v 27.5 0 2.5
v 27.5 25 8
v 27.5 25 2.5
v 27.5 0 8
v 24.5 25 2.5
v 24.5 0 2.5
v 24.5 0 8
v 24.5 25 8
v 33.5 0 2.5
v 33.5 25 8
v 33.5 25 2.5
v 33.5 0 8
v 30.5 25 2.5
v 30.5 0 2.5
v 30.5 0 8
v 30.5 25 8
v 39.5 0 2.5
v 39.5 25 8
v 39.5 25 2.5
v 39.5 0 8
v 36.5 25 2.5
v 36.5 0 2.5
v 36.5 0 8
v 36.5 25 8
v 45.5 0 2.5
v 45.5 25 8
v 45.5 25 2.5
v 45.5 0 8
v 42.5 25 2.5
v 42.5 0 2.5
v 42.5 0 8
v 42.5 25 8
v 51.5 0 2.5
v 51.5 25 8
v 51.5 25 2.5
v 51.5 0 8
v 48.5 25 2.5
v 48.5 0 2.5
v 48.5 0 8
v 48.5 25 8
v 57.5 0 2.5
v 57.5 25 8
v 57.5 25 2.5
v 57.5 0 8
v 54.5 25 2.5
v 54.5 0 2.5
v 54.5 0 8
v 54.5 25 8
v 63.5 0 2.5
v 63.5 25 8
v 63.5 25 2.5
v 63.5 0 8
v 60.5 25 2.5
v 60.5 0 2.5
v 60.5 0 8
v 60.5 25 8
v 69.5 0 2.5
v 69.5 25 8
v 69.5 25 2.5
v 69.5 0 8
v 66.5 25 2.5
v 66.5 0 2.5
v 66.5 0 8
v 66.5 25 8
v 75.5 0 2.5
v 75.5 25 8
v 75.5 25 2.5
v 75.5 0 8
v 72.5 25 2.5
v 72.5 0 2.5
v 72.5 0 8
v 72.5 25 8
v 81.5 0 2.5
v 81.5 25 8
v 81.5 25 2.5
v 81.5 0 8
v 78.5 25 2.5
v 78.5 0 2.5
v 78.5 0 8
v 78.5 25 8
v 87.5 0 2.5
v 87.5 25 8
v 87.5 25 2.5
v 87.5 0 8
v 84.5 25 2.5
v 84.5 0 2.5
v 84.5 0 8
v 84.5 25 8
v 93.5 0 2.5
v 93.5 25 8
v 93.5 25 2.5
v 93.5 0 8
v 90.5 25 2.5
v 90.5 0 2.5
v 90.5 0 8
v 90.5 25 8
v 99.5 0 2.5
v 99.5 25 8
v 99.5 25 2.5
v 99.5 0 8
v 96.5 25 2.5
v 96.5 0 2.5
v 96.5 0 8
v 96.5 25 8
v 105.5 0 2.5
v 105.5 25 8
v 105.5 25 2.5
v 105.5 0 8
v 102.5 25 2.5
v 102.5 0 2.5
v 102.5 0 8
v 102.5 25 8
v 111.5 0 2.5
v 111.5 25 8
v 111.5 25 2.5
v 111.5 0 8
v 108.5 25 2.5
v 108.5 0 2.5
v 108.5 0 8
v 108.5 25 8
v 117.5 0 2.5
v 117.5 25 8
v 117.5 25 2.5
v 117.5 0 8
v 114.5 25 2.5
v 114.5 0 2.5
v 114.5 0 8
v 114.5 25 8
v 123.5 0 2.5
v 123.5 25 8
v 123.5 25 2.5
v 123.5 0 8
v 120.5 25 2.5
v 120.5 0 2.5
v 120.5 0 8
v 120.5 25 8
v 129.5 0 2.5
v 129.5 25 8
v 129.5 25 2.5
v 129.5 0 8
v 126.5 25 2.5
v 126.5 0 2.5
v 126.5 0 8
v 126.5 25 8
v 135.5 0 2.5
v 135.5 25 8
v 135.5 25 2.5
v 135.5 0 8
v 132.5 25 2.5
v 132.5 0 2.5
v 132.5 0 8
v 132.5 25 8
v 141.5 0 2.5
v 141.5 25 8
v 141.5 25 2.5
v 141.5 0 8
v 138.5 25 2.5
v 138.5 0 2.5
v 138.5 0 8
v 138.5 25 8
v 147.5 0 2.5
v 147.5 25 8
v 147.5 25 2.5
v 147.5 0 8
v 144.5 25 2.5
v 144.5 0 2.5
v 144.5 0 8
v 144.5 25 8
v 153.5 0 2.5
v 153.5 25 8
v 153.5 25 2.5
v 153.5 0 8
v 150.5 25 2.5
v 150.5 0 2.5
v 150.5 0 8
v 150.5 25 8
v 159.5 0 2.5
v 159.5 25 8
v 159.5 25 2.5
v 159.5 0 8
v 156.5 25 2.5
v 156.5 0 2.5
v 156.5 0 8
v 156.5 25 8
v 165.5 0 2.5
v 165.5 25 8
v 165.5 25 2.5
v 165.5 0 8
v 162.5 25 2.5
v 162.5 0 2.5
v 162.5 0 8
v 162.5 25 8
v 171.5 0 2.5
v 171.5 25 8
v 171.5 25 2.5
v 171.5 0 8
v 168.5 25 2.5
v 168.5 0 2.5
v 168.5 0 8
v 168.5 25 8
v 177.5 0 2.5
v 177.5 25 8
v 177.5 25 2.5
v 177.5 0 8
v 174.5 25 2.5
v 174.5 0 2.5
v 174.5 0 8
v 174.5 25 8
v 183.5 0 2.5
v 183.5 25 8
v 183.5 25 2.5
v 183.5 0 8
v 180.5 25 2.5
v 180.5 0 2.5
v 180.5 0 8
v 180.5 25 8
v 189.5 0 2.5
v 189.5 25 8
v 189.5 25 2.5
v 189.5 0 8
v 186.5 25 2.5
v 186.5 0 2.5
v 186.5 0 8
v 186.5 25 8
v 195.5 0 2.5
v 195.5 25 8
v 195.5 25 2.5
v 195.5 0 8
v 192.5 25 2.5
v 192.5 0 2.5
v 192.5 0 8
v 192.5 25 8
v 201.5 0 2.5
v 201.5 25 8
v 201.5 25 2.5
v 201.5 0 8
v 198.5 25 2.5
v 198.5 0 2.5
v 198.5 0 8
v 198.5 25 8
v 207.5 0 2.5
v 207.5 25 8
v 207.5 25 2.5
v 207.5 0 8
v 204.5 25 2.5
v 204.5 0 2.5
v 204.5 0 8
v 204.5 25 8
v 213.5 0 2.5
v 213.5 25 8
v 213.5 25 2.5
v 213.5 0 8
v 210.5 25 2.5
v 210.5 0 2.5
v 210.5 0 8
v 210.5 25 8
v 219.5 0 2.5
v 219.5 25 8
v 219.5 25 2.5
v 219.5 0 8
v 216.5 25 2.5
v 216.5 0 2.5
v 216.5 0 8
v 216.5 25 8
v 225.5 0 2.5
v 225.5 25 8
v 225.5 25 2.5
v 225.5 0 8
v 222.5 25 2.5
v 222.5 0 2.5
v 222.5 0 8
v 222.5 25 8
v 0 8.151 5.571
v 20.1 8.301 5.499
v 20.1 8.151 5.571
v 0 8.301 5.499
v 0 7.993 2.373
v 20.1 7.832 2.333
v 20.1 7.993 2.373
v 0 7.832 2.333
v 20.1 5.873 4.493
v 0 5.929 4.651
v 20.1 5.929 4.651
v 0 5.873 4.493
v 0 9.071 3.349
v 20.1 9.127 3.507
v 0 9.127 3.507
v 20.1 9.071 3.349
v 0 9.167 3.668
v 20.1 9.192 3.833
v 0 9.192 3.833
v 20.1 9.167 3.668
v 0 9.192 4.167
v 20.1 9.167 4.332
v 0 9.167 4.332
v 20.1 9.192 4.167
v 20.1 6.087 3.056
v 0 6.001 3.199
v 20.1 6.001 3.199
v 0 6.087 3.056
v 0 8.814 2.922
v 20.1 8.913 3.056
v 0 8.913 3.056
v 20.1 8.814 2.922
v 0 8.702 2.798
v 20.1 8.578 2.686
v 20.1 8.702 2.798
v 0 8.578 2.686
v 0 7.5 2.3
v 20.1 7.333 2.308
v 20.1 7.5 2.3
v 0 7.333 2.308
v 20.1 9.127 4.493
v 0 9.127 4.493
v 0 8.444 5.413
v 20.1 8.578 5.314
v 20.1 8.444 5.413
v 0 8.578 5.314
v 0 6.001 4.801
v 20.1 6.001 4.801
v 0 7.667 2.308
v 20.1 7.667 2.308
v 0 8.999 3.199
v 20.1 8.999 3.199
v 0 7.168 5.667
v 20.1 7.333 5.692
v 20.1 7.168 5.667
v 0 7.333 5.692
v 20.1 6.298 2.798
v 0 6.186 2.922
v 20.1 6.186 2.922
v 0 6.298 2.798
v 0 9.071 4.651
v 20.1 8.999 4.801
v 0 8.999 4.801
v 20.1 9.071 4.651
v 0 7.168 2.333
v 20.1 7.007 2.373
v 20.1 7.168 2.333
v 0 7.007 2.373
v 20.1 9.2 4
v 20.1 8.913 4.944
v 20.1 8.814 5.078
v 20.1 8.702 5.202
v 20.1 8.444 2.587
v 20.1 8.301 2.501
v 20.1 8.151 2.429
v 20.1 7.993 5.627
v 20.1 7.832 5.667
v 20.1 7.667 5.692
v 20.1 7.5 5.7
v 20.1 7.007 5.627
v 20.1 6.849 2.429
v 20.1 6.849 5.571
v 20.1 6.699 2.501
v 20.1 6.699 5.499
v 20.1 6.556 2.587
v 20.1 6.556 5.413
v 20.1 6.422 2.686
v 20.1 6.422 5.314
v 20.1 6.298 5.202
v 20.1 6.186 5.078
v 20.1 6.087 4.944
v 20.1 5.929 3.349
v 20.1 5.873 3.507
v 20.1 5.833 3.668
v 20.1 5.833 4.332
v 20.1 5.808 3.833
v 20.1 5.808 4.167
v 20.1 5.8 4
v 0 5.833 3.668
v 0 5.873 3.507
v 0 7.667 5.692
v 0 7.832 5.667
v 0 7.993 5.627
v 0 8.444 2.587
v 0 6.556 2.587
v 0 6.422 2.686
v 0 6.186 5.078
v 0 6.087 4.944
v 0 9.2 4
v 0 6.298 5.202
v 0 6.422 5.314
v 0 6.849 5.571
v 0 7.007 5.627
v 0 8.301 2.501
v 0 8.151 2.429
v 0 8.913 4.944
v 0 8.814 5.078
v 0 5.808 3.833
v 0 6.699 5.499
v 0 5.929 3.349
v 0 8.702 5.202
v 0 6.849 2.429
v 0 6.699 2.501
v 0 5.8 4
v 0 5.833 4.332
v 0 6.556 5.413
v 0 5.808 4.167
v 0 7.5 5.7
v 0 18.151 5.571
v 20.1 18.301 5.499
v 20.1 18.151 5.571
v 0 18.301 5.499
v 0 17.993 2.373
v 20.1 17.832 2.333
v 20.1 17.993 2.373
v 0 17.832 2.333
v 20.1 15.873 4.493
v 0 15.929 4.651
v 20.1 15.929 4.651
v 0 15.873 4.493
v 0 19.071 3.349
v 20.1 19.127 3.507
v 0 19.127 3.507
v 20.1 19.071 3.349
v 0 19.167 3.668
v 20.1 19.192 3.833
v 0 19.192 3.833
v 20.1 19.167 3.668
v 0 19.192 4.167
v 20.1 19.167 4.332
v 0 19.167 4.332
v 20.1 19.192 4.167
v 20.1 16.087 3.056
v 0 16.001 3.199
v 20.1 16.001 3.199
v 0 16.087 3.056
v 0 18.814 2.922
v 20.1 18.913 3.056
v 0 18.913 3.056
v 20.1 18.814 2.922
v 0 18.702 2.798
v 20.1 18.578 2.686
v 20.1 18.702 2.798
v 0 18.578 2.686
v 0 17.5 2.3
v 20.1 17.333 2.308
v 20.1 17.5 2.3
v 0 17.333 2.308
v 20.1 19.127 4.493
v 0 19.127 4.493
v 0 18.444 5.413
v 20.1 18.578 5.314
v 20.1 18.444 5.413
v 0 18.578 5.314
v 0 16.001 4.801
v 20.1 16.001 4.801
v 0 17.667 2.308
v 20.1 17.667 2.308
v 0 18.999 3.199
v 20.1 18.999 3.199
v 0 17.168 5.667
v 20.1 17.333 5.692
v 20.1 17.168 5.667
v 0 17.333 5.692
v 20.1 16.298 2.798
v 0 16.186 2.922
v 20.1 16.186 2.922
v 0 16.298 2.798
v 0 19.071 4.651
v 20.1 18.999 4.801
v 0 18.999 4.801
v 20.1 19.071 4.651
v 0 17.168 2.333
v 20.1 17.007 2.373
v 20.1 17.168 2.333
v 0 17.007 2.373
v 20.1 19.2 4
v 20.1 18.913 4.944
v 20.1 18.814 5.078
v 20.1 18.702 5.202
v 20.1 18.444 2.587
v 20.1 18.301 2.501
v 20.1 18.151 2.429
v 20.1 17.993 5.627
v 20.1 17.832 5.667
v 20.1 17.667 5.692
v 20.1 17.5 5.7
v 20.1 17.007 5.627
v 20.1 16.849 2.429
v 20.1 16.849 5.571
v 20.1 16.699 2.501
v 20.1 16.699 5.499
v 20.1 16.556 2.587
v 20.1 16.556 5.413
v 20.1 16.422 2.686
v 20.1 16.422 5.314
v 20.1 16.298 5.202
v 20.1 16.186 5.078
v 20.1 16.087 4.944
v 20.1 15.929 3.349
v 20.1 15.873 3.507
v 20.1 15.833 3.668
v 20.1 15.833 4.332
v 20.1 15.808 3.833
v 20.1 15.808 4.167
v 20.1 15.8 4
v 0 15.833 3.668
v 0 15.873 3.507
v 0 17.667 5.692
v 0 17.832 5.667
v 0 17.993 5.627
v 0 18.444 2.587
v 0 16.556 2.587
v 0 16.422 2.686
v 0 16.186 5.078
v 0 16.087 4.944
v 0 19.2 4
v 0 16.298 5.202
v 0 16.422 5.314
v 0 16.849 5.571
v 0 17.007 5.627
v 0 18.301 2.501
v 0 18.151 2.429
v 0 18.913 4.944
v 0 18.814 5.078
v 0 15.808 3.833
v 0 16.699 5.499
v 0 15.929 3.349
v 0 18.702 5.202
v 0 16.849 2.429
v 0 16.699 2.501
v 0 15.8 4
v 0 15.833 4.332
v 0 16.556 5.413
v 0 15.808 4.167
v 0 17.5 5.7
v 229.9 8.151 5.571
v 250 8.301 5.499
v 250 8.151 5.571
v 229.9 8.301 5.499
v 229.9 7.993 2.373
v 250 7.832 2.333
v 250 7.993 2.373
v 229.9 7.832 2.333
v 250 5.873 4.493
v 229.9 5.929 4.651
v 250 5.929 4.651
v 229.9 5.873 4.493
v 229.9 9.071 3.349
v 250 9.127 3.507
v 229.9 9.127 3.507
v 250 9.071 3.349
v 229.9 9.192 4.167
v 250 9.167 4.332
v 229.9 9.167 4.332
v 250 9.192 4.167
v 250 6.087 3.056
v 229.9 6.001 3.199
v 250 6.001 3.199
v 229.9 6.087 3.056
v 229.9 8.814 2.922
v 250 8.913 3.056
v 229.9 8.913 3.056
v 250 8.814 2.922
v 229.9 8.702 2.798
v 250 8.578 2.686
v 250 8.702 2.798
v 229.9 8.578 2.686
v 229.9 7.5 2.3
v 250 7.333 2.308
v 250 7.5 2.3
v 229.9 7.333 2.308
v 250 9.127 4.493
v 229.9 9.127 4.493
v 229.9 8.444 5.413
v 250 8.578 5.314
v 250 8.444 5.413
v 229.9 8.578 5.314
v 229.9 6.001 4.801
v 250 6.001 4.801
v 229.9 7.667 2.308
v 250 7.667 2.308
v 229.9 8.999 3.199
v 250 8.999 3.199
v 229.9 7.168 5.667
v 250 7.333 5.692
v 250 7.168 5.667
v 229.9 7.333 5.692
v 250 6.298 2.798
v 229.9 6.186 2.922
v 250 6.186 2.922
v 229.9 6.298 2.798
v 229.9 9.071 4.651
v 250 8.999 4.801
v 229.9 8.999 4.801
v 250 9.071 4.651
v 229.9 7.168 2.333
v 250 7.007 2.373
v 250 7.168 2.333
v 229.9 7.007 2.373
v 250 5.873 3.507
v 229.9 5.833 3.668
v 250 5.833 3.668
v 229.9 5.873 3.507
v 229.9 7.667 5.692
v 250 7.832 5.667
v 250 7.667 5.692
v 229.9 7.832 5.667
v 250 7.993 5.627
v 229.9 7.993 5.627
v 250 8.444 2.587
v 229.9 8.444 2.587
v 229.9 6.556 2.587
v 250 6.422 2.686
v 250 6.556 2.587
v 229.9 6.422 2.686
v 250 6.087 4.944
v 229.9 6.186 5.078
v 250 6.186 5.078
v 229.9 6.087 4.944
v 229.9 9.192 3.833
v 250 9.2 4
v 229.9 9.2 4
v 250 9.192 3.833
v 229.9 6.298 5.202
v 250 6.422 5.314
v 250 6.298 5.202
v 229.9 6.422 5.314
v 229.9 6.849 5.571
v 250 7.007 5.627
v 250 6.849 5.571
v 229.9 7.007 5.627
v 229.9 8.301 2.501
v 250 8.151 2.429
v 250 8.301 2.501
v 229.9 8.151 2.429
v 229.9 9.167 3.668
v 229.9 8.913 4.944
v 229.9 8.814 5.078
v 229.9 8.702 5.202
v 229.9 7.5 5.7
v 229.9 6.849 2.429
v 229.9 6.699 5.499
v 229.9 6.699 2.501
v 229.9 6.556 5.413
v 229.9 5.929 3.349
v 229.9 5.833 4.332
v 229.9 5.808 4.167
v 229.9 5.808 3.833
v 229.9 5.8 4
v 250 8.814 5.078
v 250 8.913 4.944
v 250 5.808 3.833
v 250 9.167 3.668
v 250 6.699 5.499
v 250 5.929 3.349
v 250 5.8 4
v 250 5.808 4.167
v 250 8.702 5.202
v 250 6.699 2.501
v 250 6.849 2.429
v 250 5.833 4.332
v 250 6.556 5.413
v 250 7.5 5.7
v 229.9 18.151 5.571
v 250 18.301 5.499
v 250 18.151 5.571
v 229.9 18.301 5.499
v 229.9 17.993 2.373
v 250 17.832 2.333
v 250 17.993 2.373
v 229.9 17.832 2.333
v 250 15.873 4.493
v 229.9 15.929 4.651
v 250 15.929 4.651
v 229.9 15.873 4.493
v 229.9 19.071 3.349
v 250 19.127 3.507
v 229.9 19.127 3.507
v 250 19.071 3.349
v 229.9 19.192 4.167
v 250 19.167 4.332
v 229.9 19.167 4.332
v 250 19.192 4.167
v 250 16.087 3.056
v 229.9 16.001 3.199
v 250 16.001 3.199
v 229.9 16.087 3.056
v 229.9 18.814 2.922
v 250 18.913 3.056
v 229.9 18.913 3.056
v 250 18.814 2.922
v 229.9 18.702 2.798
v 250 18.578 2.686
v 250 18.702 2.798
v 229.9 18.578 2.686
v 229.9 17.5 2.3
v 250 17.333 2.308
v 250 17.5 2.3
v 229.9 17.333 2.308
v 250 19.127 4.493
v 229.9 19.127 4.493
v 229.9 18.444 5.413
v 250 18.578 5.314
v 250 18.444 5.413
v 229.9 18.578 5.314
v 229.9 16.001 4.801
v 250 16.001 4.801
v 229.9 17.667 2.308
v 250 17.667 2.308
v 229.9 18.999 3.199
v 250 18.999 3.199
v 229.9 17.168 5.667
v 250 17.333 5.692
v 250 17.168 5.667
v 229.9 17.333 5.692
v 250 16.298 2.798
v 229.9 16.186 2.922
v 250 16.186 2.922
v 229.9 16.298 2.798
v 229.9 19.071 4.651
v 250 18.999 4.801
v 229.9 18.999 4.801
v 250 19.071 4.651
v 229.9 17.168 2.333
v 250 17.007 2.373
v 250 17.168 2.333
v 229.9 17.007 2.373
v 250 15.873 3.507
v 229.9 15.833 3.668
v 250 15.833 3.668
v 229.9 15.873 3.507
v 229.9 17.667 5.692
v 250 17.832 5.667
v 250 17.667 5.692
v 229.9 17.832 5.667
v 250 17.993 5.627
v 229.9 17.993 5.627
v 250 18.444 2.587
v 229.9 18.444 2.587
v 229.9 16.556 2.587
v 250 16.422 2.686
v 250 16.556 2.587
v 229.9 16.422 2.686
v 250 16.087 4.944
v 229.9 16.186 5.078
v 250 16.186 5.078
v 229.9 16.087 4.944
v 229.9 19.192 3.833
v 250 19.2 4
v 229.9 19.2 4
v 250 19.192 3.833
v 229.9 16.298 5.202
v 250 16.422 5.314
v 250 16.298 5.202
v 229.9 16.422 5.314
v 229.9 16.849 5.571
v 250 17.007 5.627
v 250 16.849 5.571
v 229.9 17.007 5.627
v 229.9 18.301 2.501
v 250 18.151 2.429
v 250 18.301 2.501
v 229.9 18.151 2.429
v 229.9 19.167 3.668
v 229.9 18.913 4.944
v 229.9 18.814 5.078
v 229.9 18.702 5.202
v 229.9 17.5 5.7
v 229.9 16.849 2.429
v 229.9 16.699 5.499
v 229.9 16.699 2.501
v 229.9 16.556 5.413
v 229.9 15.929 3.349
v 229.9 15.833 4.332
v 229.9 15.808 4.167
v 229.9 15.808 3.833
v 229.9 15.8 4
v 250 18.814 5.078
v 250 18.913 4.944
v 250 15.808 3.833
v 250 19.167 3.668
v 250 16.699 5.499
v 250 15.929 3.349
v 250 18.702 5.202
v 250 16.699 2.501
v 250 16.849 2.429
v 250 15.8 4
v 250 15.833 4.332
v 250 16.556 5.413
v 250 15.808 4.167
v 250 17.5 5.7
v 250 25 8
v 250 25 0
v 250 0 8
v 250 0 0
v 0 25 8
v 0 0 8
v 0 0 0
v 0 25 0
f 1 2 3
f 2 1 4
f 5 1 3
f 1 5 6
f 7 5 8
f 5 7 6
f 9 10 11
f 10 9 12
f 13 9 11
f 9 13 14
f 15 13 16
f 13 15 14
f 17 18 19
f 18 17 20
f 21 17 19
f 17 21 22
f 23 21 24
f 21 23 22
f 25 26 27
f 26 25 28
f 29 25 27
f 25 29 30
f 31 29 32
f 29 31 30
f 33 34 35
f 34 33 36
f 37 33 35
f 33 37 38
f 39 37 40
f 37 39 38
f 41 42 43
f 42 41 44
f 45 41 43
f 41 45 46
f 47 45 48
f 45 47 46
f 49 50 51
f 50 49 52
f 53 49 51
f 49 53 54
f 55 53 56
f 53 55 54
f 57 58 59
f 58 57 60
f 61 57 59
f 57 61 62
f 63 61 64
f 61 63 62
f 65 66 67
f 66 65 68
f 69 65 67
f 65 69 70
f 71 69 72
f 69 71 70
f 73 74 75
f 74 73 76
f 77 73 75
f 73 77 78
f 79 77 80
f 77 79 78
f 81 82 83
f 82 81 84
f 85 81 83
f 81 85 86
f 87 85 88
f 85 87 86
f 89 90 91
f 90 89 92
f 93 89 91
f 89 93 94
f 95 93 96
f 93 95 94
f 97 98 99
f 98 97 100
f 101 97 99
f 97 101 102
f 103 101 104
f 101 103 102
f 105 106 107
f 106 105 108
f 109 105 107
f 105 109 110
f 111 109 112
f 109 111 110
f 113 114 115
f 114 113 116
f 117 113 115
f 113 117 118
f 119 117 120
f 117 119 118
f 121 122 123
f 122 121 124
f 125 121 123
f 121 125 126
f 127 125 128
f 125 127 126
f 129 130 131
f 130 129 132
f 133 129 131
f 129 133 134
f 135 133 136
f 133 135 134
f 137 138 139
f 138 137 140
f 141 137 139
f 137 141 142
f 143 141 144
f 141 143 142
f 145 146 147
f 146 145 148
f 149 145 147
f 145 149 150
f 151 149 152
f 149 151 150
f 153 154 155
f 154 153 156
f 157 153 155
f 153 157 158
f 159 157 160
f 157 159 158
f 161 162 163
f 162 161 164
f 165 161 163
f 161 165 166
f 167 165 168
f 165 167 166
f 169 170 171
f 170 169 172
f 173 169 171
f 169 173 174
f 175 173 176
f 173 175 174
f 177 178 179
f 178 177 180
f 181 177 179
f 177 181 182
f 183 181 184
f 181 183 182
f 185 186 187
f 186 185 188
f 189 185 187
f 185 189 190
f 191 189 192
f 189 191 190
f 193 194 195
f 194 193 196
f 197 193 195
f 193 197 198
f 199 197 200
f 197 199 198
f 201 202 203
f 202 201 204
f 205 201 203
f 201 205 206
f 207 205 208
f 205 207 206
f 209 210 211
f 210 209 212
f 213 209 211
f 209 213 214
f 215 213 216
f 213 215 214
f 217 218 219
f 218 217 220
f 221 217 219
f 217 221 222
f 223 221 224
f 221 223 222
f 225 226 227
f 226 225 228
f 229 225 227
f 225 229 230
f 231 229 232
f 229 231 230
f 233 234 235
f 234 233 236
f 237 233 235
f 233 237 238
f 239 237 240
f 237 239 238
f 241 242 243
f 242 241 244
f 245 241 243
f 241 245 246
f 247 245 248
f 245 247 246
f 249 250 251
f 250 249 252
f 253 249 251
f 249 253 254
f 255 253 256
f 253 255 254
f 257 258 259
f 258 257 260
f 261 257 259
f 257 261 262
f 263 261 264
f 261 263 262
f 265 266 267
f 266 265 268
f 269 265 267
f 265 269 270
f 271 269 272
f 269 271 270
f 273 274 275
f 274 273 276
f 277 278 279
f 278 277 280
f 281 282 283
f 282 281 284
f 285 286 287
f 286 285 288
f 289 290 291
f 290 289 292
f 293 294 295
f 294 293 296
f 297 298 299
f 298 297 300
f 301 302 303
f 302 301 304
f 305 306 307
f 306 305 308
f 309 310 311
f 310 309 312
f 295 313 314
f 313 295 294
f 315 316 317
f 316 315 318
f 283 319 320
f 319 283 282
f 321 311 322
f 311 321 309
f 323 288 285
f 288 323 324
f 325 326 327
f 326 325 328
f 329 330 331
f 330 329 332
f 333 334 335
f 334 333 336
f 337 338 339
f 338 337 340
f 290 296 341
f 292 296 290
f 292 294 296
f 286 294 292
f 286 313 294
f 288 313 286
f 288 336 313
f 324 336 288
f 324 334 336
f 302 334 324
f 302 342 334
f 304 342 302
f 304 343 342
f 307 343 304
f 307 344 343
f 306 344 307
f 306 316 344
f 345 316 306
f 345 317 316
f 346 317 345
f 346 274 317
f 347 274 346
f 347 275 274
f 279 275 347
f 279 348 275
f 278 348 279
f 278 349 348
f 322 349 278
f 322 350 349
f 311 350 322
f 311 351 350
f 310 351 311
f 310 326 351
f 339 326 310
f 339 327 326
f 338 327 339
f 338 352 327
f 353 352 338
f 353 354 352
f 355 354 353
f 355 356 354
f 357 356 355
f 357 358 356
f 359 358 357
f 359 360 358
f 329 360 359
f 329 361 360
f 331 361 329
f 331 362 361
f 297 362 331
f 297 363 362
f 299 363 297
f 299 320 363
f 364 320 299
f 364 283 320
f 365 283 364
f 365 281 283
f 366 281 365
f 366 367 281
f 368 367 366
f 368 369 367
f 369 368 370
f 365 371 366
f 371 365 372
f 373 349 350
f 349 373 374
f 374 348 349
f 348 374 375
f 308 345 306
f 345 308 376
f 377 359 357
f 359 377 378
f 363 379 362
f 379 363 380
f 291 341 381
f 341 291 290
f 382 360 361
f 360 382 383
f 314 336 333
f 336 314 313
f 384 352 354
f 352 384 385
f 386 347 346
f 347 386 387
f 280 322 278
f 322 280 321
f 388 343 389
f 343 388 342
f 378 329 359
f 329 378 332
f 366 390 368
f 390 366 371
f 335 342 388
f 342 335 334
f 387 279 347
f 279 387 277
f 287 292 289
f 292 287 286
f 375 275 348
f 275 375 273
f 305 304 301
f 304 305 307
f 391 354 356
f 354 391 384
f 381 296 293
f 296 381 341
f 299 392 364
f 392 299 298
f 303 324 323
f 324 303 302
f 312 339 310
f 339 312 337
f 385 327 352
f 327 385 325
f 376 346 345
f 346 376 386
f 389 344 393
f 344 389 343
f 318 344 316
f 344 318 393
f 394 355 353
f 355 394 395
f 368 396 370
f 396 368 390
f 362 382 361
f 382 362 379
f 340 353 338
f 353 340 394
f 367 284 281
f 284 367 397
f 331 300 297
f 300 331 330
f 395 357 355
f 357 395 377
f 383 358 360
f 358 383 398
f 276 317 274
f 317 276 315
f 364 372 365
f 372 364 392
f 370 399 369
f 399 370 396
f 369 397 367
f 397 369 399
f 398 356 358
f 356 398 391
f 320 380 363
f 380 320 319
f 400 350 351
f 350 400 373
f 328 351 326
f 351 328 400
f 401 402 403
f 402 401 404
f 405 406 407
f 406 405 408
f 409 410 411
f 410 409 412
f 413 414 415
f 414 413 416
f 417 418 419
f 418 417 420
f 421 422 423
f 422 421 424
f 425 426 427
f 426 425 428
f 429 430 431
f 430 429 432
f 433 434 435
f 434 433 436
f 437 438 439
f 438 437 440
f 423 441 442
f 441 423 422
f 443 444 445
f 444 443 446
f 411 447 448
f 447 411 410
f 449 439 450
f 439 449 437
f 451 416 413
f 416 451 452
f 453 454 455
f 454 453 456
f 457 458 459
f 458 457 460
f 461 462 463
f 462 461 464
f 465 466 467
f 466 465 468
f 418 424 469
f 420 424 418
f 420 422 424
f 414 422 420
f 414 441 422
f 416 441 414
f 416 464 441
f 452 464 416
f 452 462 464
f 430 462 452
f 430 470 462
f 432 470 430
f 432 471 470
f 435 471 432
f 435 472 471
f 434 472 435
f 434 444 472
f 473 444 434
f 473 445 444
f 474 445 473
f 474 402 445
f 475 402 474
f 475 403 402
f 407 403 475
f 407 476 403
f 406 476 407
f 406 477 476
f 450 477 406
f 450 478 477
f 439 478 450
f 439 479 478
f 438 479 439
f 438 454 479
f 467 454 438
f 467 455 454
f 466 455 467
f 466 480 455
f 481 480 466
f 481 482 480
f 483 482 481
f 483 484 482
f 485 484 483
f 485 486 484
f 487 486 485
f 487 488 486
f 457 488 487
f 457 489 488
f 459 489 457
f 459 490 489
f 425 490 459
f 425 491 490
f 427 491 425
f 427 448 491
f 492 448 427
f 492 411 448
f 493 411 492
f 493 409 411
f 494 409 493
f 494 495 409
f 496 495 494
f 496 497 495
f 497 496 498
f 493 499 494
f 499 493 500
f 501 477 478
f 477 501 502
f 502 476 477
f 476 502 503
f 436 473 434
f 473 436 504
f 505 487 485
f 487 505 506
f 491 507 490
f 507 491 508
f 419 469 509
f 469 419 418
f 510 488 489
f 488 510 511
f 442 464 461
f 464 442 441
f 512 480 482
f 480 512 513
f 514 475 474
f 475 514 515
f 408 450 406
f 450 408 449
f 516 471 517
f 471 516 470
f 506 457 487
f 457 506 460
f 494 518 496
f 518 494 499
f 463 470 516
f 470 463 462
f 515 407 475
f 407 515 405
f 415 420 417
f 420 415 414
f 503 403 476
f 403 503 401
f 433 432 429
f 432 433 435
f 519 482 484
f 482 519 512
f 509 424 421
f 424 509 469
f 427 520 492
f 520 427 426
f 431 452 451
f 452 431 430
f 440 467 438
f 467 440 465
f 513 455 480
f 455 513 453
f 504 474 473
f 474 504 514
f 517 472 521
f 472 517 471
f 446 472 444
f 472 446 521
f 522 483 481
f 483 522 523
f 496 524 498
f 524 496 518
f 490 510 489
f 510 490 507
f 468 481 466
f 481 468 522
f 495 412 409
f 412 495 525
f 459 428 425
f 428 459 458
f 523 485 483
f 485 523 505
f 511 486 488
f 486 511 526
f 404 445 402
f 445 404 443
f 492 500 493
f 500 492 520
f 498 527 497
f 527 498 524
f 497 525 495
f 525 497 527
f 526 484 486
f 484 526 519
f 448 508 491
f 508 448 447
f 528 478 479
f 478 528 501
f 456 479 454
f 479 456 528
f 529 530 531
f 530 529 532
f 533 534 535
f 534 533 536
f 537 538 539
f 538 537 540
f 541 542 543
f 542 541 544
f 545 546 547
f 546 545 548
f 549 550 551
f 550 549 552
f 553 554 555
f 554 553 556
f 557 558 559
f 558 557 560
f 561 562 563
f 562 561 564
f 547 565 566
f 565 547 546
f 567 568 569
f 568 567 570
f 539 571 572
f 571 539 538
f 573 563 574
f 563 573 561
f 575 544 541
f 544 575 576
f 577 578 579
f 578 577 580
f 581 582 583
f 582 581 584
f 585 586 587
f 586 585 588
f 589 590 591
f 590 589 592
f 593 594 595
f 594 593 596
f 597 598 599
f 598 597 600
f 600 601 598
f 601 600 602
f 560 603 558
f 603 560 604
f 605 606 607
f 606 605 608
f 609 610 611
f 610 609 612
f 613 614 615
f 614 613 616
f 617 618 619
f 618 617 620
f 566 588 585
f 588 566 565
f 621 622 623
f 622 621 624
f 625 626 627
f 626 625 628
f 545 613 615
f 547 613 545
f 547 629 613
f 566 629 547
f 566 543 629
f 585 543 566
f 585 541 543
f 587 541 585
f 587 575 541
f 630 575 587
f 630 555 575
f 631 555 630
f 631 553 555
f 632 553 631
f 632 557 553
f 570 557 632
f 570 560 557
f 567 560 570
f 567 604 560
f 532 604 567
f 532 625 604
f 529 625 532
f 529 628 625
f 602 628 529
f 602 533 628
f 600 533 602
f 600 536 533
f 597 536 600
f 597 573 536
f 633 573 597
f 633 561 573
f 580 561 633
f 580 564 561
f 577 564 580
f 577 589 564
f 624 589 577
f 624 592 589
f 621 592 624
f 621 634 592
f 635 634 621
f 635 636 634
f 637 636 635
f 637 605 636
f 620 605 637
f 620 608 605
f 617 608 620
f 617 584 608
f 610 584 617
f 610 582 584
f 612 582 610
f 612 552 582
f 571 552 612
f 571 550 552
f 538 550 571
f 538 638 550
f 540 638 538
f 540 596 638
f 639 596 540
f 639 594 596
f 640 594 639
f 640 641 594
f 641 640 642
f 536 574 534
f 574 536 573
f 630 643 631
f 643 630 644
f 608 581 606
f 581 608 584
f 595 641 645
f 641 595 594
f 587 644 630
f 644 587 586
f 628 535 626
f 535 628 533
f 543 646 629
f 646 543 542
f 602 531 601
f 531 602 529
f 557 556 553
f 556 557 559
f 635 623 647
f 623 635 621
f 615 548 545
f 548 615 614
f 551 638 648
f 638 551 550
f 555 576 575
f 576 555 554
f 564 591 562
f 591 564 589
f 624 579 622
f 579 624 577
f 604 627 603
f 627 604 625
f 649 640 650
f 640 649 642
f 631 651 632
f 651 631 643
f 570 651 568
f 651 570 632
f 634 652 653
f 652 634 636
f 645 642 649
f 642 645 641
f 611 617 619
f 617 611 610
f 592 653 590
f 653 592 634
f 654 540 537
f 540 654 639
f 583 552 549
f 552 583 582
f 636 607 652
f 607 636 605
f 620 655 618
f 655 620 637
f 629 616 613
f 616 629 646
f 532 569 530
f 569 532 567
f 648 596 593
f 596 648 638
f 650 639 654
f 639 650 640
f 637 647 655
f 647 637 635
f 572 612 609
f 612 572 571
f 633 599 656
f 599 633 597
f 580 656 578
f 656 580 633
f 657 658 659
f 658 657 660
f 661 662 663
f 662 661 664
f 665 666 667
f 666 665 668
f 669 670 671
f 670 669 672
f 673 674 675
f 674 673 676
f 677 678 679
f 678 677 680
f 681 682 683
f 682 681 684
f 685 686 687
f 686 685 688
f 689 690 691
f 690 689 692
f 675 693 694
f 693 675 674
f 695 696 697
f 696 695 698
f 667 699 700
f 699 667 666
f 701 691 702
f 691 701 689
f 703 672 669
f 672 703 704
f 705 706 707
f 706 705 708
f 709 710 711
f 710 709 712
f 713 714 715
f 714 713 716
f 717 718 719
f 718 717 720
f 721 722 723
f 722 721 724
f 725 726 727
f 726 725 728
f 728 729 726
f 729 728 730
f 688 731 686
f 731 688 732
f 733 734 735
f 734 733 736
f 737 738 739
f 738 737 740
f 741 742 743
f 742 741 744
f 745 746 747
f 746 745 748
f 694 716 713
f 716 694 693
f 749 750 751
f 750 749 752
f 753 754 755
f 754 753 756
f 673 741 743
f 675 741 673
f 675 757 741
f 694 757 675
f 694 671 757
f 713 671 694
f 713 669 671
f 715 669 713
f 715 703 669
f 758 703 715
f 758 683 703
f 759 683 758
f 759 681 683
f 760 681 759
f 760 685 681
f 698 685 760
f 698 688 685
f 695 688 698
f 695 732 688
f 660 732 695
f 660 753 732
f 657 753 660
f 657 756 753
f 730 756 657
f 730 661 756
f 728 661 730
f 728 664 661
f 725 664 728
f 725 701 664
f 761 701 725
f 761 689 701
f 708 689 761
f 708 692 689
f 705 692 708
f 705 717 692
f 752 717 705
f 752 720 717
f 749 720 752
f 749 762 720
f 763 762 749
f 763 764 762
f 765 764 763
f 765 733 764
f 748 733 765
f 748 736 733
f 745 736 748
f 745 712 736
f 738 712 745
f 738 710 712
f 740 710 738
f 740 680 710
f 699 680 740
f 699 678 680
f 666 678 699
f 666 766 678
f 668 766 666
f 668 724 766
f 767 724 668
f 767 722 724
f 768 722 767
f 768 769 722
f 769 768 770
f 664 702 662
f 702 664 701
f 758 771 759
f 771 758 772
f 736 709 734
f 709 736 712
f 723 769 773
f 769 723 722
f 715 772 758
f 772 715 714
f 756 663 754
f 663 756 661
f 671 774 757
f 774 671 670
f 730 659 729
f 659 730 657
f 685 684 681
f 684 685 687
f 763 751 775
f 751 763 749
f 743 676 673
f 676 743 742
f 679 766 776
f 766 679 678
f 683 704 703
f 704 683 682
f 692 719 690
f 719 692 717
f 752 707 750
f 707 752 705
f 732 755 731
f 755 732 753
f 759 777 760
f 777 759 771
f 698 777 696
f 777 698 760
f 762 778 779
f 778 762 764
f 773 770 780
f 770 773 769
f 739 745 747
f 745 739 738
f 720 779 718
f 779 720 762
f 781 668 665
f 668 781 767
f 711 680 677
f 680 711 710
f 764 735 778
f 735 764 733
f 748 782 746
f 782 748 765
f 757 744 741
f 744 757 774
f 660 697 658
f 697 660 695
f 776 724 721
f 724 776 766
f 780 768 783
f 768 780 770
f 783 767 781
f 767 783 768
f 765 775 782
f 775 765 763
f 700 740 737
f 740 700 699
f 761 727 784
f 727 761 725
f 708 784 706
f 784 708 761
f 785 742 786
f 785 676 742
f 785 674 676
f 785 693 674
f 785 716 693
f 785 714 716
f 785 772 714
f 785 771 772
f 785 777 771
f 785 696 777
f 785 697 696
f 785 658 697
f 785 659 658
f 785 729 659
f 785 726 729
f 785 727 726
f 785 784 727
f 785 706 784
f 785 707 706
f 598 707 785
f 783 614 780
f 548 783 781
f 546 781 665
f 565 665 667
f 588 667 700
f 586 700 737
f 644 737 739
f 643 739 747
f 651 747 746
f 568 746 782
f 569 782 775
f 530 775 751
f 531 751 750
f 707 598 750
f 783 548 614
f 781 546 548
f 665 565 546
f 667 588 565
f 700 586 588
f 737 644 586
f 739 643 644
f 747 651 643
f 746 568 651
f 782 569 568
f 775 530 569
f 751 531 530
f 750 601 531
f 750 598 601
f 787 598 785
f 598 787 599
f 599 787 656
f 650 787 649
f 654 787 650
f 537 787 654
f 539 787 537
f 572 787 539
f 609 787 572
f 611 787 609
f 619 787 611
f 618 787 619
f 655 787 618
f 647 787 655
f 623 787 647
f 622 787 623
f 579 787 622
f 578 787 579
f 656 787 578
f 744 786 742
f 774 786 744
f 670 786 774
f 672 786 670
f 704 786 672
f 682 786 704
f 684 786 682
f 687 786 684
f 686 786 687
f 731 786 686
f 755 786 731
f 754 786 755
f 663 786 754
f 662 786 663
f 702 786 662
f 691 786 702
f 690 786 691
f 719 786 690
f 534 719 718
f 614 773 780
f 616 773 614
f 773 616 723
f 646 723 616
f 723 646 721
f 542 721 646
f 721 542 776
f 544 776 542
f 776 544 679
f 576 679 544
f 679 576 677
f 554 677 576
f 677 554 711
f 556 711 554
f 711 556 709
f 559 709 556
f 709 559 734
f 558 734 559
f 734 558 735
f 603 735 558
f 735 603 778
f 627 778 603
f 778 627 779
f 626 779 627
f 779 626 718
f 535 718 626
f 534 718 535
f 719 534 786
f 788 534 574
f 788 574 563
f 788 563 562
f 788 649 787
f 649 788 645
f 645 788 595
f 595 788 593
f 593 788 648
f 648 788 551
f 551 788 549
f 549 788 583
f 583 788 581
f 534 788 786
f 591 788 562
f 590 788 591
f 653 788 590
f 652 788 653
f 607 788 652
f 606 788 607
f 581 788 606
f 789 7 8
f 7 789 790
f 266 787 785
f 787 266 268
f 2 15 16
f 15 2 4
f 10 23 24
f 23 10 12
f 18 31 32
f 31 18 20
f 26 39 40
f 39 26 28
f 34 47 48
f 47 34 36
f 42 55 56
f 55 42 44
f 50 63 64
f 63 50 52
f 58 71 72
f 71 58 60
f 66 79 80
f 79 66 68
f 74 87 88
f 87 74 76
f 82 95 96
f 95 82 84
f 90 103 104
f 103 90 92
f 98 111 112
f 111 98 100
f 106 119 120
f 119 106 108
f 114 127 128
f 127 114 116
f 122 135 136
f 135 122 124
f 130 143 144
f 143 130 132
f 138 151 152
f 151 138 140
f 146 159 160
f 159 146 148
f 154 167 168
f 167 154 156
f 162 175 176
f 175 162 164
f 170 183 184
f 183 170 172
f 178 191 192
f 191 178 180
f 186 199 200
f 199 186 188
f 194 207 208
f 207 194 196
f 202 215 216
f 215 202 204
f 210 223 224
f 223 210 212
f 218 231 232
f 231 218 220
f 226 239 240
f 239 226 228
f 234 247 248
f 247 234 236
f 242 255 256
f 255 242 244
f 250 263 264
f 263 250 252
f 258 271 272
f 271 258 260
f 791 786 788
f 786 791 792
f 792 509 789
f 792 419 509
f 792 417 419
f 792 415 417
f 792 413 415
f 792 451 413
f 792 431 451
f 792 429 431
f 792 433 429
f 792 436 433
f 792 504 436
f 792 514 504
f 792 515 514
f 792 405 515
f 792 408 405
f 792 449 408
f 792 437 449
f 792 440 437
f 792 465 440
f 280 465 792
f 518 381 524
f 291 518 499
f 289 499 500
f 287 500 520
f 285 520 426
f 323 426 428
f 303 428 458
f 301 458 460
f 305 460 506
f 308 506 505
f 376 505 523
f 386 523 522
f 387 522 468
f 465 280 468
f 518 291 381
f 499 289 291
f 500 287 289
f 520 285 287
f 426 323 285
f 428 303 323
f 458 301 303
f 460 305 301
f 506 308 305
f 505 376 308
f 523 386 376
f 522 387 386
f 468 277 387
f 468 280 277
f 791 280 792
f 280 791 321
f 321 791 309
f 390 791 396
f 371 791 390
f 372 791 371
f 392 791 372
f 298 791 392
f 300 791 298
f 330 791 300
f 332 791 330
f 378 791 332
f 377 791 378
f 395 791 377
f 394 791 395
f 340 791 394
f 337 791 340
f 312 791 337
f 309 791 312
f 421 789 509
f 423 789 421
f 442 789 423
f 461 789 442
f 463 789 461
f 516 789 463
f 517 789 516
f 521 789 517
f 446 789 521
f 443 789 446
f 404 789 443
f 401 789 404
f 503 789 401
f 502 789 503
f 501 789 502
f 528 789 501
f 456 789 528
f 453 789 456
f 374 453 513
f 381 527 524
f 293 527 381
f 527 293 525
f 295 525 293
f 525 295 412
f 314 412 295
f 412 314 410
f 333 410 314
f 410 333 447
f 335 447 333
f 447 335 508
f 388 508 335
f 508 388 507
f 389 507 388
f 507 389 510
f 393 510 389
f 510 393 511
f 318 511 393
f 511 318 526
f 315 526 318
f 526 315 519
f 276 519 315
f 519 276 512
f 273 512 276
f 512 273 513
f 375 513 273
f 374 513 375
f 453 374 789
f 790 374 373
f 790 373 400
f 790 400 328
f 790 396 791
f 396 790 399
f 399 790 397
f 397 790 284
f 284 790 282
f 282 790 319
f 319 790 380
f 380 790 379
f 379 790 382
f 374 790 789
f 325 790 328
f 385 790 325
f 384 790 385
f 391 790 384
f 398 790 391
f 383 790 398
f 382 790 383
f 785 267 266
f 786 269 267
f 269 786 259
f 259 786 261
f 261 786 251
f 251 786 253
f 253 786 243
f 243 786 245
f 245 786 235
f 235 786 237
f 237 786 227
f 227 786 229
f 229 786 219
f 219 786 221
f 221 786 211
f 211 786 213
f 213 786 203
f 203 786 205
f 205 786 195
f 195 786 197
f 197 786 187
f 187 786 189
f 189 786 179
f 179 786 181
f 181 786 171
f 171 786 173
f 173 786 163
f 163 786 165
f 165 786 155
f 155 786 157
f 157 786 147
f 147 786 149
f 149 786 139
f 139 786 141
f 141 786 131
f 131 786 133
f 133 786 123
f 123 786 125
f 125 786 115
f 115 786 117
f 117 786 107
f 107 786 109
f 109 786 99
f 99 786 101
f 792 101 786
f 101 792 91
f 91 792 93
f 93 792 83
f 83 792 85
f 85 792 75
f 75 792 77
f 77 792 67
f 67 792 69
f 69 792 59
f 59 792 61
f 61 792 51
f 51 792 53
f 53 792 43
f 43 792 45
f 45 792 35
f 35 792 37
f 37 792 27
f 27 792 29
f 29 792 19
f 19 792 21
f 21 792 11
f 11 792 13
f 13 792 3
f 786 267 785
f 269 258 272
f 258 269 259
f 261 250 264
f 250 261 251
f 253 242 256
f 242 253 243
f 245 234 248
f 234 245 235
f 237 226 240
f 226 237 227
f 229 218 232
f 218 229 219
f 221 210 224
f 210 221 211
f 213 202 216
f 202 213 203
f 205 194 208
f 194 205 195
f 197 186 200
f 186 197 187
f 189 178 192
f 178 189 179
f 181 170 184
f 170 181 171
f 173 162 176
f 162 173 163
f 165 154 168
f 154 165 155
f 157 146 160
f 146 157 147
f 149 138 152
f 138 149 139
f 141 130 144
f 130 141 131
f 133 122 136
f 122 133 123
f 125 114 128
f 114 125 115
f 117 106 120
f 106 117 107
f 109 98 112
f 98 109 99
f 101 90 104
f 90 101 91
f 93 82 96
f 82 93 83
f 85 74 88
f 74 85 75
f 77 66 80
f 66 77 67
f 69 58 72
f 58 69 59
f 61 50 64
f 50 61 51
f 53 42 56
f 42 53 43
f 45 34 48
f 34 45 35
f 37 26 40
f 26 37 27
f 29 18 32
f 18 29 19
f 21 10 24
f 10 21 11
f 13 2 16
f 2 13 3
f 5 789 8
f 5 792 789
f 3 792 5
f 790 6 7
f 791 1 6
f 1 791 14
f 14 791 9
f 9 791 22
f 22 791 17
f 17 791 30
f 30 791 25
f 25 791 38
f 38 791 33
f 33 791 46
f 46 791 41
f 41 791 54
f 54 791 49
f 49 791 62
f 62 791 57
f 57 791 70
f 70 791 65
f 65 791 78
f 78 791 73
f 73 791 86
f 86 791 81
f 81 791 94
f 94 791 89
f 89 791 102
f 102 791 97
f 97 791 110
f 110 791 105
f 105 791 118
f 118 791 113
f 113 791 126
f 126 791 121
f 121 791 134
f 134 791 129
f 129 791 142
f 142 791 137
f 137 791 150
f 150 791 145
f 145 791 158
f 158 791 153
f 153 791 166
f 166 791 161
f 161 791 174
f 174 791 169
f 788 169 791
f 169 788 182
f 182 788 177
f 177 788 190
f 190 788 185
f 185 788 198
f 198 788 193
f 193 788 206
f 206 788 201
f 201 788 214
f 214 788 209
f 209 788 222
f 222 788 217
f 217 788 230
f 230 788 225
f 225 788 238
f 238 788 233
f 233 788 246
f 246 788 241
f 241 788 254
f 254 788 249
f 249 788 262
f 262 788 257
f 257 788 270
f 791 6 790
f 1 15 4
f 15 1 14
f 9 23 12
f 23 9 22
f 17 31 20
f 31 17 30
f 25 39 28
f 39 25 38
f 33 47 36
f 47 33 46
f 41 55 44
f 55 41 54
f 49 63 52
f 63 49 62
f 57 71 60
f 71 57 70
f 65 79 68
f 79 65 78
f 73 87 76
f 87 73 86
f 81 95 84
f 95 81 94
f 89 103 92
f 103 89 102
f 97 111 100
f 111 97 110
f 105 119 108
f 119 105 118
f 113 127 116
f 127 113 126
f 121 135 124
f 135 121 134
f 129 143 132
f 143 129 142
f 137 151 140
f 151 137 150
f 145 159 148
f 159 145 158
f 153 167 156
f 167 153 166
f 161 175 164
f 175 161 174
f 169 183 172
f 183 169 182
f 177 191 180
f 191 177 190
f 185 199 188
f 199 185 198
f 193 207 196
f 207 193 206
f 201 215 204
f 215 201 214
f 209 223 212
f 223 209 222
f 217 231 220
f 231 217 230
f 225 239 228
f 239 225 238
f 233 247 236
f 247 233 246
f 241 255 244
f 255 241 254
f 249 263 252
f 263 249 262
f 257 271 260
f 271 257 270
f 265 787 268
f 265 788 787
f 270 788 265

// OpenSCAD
// file: config.scad
// ─────────────────────────────────────────────────────────────────────────────
//  config.scad  –  Global parameters for modular open-frame desktop
//                  mini-server rack
//
//  Rack outer envelope : 250 × 260 × 285 mm  (W × D × H)
//  Fastener standard   : M3 heat-set inserts + M3 cap-head screws
//  Print target        : Bambu H2D (350 × 320 mm bed)
// ─────────────────────────────────────────────────────────────────────────────

// ── Rack outer envelope ───────────────────────────────────────────────────────
RACK_W = 250;    // overall width   (X) mm
RACK_D = 260;    // overall depth   (Y) mm
RACK_H = 285;    // overall height  (Z) mm

// ── Side rail cross-section ───────────────────────────────────────────────────
RAIL_W = 20;     // rail thickness  (X) mm
RAIL_D = RACK_D; // rail runs full depth
RAIL_H = RACK_H; // rail runs full height

// Usable inner width between the two rails
INNER_W = RACK_W - 2 * RAIL_W;   // 210 mm

// Pitch (mm) between mounting-insert rows along rail height
SLOT_PITCH = 20;

// ── Crossbar ─────────────────────────────────────────────────────────────────
CBAR_W = RACK_W;  // full rack width  (X)
CBAR_D = 25;      // front-to-back depth (Y)
CBAR_H = 8;       // thickness (Z)

// Y offsets of the two mounting screws per crossbar end
// (measured from the crossbar's own front face)
CBAR_MOUNT_Y1 = CBAR_D * 0.30;   // ≈ 7.5 mm
CBAR_MOUNT_Y2 = CBAR_D * 0.70;   // ≈ 17.5 mm

// ── Device dimensions  W × D × H  (all in mm) ────────────────────────────────
MM2_W = 196.85;  MM2_D = 196.85;  MM2_H = 35.8;   // Mac mini M2
MM4_W = 127.0;   MM4_D = 127.0;   MM4_H = 50.0;   // Mac mini M4
PI5_W = 85.0;    PI5_D = 56.0;    PI5_H = 17.0;   // Raspberry Pi 5 PCB
ATV_W = 93.0;    ATV_D = 93.0;    ATV_H = 31.0;   // Apple TV 4K 3rd gen
FX_W  = 167.0;   FX_D  = 104.0;   FX_H  = 52.0;   // Inseego FX4100

// ── Raspberry Pi 5 mounting-hole grid (from board origin corner) ──────────────
PI5_HOLE_X1 = 3.5;
PI5_HOLE_X2 = 61.5;
PI5_HOLE_Y1 = 3.5;
PI5_HOLE_Y2 = 52.5;
PI5_STANDOFF_H  = 5.0;   // height of standoff posts above plate floor
PI5_STANDOFF_OD = 6.0;   // standoff outer diameter
PI5_HOLE_D      = 2.7;   // M2.5 clearance hole through standoff

// ── Fasteners – M3 heat-set inserts + M3 screws ───────────────────────────────
M3_INSERT_D = 4.7;   // insert outer Ø  (press-fit into 4.5 mm hole → +0.2 entry)
M3_INSERT_H = 5.7;   // insert depth
M3_CLEAR_D  = 3.4;   // M3 clearance hole Ø
M3_HEAD_D   = 6.0;   // M3 cap-head Ø
M3_HEAD_H   = 3.0;   // M3 cap-head height
M3_CBORE_D  = 6.5;   // counterbore Ø (seat for cap head)

// ── Print / geometry ──────────────────────────────────────────────────────────
WALL      = 3.0;   // shell wall thickness
FLOOR     = 2.5;   // tray / plate floor thickness
LIP_H     = 6.0;   // front retention-lip height above device top
CLEARANCE = 0.2;   // per-side fit clearance (0.4 mm total)

// ── Vent slots ────────────────────────────────────────────────────────────────
VENT_W     = 3.0;    // slot width
VENT_L     = 20.0;   // slot length (along its own long axis)
VENT_PITCH = 6.0;    // centre-to-centre pitch between slots

// ── Cable-relief slots in rear tray wall ─────────────────────────────────────
CABLE_SLOT_W = 8.0;
CABLE_SLOT_H = 20.0;  // height of opening in rear wall

// ── Anti-vibration feet ───────────────────────────────────────────────────────
FOOT_OD       = 25;   // outer Ø
FOOT_H        = 10;   // total height
FOOT_RUBBER_D = 20;   // rubber-pad recess Ø
FOOT_RUBBER_H = 3;    // rubber-pad recess depth

// ── Strap slot for FX4100 cradle ─────────────────────────────────────────────
STRAP_W = 20;    // strap width
STRAP_H =  3;    // strap slot thickness (clearance)

// ── Render quality ────────────────────────────────────────────────────────────
$fn = 64;
// main file
// ─────────────────────────────────────────────────────────────────────────────
//  crossbar.scad  –  Horizontal crossbar with vent slots
//
//  Spans the full rack width (CBAR_W = RACK_W = 250 mm).
//  Each end overlaps the respective side rail (RAIL_W = 20 mm) and carries
//  two M3 clearance holes that align with the inner-face insert grid in the
//  side rails.
//
//  Vent slots run front-to-back (Y direction) through the inner span,
//  maximising airflow while preserving the end flanges.
// ─────────────────────────────────────────────────────────────────────────────
include <config.scad>

module crossbar() {
    difference() {
        // ── Solid body ───────────────────────────────────────────────────────
        cube([CBAR_W, CBAR_D, CBAR_H]);

        // ── Vent slots (run in Y, spaced along X through the inner span) ─────
        for (x = [RAIL_W + VENT_PITCH
                  : VENT_PITCH
                  : RACK_W - RAIL_W - VENT_PITCH / 2]) {
            translate([x - VENT_W / 2, -0.1, FLOOR])
                cube([VENT_W, CBAR_D + 0.2, CBAR_H - FLOOR + 0.1]);
        }

        // ── Left-rail M3 clearance holes (left end flange) ───────────────────
        for (y = [CBAR_MOUNT_Y1, CBAR_MOUNT_Y2]) {
            translate([-0.1, y, CBAR_H / 2])
                rotate([0, 90, 0])
                    cylinder(d = M3_CLEAR_D, h = RAIL_W + 0.2);
        }

        // ── Right-rail M3 clearance holes (right end flange) ─────────────────
        for (y = [CBAR_MOUNT_Y1, CBAR_MOUNT_Y2]) {
            translate([RACK_W - RAIL_W - 0.1, y, CBAR_H / 2])
                rotate([0, 90, 0])
                    cylinder(d = M3_CLEAR_D, h = RAIL_W + 0.2);
        }
    }
}

crossbar();
